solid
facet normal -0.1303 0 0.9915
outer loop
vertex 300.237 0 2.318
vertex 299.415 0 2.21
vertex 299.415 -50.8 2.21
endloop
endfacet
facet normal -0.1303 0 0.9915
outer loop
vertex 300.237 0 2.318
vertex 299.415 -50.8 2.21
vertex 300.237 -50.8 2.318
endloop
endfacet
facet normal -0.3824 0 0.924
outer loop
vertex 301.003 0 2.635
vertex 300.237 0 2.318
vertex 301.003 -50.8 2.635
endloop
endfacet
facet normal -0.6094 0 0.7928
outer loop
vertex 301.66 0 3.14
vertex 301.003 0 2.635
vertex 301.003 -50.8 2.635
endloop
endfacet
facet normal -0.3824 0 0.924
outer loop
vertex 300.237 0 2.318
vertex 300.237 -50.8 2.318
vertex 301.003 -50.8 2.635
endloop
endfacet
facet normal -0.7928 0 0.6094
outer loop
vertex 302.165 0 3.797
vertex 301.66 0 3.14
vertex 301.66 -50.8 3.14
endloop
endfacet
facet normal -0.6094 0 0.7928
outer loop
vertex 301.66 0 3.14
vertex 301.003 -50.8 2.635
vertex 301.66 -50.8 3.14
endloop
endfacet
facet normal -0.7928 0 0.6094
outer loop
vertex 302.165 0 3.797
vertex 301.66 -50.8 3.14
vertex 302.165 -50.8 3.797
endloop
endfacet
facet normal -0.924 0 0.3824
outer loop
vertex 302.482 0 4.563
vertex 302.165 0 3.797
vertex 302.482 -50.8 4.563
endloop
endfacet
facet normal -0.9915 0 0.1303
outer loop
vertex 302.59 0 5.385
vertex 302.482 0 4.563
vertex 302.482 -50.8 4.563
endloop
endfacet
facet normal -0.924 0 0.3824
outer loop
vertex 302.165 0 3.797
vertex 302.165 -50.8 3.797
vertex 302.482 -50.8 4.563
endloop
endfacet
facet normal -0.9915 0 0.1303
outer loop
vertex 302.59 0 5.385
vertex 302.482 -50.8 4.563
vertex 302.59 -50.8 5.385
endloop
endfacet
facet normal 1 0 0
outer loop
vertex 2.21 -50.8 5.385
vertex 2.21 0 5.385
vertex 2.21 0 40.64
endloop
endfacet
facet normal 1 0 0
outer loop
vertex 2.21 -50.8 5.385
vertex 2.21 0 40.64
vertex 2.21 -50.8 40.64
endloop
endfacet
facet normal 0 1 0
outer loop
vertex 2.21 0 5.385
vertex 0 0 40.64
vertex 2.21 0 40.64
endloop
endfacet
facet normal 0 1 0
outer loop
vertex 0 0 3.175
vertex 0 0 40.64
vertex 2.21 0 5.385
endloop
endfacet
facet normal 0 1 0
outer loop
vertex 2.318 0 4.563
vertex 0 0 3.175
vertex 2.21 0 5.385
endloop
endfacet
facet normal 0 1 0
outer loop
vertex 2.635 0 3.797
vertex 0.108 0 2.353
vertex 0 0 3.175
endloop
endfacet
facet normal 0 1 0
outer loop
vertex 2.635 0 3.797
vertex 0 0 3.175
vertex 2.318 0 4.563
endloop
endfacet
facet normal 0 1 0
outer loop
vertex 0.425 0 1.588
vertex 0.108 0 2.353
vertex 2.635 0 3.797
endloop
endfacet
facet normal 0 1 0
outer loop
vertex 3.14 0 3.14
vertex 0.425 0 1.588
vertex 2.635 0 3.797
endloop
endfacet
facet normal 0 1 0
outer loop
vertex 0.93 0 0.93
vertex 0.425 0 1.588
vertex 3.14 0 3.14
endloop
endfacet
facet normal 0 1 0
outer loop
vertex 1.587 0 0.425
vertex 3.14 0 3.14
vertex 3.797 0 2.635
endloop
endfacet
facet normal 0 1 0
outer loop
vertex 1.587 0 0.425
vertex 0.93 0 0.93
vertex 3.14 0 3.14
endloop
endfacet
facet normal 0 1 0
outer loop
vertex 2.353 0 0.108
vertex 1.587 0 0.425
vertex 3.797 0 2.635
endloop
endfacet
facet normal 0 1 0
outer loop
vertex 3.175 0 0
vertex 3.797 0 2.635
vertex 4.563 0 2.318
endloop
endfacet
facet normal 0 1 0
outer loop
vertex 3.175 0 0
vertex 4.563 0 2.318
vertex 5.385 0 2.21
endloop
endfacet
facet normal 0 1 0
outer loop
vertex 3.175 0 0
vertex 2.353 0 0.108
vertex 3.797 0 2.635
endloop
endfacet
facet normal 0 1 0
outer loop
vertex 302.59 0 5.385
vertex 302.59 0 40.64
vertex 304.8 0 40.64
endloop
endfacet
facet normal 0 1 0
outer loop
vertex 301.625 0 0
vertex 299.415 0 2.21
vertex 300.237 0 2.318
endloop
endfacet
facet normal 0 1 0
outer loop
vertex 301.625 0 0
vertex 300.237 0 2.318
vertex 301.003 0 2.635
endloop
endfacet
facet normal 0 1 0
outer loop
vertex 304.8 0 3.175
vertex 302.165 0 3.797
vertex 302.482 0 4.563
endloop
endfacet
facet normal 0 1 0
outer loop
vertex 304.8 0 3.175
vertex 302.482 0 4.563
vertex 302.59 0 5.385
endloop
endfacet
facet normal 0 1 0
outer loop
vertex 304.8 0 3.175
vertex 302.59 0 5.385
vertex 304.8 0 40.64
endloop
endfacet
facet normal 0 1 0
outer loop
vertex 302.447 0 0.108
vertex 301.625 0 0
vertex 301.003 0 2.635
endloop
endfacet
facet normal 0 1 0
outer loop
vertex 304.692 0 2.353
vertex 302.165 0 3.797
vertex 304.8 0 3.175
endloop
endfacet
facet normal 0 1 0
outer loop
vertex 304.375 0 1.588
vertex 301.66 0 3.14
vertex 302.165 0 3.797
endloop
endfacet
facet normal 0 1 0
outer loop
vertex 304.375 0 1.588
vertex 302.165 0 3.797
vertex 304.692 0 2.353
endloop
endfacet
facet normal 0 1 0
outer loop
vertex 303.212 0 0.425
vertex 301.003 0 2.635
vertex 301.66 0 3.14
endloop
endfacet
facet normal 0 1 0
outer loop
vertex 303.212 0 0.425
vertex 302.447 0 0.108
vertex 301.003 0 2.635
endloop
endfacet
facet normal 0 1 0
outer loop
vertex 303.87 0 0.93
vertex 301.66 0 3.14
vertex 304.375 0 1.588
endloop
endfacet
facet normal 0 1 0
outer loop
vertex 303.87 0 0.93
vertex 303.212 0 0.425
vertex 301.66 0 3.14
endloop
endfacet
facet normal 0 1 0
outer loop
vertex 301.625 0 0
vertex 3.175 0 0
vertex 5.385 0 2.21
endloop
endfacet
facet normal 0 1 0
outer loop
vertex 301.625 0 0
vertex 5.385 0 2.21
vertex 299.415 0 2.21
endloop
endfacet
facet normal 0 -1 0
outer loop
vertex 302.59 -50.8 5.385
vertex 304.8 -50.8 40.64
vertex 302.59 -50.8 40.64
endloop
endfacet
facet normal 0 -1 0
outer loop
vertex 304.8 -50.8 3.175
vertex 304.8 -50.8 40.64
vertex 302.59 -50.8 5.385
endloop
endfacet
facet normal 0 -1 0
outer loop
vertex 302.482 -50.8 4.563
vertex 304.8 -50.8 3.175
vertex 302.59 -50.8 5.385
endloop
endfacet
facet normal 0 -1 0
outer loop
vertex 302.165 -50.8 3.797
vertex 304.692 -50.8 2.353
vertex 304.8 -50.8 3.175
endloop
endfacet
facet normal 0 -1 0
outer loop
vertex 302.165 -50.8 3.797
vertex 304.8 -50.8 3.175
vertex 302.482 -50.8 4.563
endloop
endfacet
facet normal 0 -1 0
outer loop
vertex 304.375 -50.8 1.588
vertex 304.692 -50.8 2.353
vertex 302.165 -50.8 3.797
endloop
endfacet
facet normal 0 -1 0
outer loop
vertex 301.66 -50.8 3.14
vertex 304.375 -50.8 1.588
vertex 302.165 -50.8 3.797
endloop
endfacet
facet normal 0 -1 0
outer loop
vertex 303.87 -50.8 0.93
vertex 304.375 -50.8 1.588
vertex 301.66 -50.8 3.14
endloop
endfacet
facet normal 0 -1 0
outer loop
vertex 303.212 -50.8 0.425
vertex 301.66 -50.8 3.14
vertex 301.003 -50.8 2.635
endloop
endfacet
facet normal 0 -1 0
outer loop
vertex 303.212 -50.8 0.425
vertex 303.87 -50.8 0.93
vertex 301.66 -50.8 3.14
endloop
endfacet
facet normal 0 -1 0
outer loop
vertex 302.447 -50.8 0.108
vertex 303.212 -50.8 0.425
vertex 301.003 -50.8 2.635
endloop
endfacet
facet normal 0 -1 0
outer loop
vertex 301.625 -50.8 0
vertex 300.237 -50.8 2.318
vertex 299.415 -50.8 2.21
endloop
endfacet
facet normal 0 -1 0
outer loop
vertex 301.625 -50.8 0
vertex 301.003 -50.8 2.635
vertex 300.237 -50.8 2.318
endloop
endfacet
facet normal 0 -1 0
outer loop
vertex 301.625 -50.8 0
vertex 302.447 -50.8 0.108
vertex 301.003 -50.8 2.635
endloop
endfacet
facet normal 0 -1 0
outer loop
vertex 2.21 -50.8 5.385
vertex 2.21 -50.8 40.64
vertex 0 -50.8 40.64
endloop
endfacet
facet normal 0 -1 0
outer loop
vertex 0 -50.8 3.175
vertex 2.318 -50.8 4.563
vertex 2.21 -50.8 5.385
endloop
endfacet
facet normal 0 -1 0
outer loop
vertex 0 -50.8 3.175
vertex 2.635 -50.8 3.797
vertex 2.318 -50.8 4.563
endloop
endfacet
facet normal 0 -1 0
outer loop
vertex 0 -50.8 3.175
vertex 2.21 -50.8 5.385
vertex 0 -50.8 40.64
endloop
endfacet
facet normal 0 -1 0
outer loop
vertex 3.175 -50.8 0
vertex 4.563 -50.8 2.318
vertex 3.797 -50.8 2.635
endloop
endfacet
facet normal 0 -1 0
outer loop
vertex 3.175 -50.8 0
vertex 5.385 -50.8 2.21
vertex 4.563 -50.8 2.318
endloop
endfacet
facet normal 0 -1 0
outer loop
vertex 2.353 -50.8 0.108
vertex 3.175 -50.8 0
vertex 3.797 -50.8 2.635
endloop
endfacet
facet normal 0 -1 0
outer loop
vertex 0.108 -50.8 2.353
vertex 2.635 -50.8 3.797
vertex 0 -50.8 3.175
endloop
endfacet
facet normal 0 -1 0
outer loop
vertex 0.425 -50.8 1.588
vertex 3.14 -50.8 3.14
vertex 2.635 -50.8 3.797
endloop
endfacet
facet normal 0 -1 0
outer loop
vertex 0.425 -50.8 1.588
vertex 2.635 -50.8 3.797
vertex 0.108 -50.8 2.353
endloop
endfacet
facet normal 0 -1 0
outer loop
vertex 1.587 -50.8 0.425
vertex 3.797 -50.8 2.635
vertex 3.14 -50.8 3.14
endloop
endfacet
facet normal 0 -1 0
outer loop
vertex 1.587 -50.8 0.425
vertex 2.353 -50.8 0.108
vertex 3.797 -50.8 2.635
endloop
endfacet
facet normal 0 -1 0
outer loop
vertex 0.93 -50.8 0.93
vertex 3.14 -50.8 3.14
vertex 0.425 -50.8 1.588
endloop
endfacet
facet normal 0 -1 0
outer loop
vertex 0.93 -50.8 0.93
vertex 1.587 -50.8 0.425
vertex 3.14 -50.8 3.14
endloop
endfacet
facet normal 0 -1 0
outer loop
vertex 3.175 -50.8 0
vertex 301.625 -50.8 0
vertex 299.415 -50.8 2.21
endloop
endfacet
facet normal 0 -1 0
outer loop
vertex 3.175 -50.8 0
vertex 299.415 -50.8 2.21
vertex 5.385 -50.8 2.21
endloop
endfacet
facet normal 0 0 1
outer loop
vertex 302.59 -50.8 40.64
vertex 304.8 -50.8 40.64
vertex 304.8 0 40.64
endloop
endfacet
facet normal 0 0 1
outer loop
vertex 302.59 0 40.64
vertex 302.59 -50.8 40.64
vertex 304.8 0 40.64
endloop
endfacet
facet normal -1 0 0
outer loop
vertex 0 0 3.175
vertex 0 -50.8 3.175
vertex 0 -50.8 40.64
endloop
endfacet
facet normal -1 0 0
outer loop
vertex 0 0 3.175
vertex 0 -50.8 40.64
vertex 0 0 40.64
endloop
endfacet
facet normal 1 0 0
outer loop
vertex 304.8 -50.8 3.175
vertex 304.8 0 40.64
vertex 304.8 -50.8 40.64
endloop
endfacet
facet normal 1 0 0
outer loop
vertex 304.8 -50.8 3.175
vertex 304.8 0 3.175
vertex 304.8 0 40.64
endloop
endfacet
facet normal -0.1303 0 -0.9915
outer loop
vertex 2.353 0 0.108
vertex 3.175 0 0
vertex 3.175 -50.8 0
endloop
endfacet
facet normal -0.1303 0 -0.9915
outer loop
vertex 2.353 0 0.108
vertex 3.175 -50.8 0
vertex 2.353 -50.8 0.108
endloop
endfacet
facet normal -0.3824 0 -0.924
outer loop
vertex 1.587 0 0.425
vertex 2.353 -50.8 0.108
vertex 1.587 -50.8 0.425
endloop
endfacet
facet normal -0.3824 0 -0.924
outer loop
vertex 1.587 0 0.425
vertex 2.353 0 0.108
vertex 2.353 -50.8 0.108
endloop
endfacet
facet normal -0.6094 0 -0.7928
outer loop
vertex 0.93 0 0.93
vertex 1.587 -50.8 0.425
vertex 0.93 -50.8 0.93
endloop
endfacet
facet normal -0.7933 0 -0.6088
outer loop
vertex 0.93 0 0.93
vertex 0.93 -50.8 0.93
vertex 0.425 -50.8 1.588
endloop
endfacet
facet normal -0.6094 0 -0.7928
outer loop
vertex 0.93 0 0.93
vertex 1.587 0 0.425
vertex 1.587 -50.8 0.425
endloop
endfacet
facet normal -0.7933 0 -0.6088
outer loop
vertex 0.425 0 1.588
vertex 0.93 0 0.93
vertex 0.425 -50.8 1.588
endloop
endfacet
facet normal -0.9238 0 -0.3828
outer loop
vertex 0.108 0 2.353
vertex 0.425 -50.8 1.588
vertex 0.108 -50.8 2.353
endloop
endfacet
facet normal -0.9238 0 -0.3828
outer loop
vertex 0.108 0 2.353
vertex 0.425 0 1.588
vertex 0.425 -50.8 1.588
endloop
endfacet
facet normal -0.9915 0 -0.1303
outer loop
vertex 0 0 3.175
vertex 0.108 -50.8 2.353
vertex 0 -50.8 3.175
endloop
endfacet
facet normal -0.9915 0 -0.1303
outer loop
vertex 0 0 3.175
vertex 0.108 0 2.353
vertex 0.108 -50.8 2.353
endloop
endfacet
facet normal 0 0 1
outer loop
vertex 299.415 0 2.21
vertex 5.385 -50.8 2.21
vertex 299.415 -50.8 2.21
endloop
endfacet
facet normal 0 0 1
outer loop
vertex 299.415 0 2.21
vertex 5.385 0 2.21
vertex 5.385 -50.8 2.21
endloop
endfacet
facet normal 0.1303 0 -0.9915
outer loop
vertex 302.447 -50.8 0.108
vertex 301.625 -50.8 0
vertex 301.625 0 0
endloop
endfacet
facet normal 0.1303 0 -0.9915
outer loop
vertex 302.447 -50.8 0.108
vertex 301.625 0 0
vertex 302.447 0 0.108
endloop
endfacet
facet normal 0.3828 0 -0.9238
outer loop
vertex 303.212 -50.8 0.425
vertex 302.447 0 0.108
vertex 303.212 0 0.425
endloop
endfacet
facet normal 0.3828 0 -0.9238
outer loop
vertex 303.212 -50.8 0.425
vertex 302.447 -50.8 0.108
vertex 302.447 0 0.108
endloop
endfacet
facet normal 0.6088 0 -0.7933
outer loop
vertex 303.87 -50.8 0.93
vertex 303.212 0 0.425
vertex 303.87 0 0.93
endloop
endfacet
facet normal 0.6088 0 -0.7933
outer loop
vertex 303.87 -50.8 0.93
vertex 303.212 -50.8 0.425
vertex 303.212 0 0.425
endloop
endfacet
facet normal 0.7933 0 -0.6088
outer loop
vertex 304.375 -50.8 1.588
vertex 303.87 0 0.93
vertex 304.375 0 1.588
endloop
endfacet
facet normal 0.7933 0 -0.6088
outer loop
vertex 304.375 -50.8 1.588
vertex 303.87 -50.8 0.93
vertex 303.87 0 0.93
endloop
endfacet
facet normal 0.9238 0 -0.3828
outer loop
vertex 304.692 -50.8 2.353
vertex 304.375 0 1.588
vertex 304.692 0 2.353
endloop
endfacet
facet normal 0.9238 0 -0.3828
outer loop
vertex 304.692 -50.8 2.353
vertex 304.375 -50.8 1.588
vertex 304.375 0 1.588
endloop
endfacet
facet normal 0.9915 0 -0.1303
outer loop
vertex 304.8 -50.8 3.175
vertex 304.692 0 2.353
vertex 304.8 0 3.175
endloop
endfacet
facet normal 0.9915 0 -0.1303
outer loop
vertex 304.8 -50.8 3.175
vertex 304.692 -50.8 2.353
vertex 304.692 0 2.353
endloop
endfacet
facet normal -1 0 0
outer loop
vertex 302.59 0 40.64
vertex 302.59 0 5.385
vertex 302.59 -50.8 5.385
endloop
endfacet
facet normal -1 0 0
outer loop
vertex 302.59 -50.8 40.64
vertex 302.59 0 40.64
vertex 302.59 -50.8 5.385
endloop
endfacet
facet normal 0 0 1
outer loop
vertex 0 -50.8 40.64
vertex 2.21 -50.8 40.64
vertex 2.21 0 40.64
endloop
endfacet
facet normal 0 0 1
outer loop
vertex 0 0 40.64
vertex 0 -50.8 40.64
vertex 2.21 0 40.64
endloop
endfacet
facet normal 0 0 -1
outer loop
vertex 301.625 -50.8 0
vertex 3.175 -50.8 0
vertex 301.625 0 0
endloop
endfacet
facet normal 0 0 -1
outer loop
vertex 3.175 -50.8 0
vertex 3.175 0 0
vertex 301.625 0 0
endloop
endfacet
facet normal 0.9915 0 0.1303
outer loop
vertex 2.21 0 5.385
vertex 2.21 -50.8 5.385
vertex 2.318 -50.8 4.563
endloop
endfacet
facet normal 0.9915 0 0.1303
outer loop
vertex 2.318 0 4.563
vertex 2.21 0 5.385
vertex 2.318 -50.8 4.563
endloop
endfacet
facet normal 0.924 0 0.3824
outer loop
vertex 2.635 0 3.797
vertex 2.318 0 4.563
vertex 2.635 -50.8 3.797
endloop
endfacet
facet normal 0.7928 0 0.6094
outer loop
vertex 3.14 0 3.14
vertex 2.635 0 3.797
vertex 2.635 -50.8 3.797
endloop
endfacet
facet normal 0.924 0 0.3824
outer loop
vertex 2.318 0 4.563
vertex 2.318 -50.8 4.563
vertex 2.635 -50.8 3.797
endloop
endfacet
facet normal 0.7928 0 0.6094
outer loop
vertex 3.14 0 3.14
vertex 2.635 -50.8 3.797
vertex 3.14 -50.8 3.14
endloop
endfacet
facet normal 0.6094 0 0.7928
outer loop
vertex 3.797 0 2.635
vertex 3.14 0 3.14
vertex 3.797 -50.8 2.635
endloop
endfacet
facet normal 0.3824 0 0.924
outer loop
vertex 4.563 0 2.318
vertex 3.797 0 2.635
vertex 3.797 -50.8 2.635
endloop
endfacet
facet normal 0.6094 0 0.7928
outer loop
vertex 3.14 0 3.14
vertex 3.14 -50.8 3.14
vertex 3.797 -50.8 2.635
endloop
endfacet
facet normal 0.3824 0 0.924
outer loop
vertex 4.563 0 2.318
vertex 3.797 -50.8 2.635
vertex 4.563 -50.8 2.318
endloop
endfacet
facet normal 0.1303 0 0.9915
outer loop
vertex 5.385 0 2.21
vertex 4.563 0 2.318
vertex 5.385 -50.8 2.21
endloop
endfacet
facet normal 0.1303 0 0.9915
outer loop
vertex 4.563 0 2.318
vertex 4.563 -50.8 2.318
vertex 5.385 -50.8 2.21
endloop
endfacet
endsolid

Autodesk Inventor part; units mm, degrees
ref_plane "YZ Plane" through (0, 0, 0) normal (1, 0, 0) x (0, 1, 0)
ref_plane "XZ Plane" through (0, 0, 0) normal (0, 1, 0) x (-1, 0, 0)
ref_plane "XY Plane" through (0, 0, 0) normal (0, 0, 1) x (1, 0, 0)
sketch "Sketch1" plane through (0, 0, 0) normal (0, 0, 1) x (1, 0, 0)
  line L0 (0, 0) -> (304.8, 0)
  line L1 (304.8, 0) -> (304.8, -50.8)
  line L2 (304.8, -50.8) -> (0, -50.8)
  line L3 (0, -50.8) -> (0, 0)
  dimension "d0" = 304.8
  dimension "d1" = 50.8
extrude "Extrusion1" add sketch "Sketch1" along normal blind 2.2098
sketch "Sketch2" plane through (0, 0, 2.2098) normal (0, 0, 1) x (1, 0, 0)
  line L0 (0, -50.8) -> (304.8, -50.8) projected
  line L1 (0, 0) -> (2.2098, 0)
  line L2 (2.2098, 0) -> (2.2098, -50.8)
  line L3 (2.2098, -50.8) -> (0, -50.8)
  line L4 (0, -50.8) -> (0, 0)
  line L5 (304.8, 0) -> (302.5902, 0)
  line L6 (302.5902, 0) -> (302.5902, -50.8)
  line L7 (302.5902, -50.8) -> (304.8, -50.8)
  line L8 (304.8, -50.8) -> (304.8, 0)
  dimension "d4" = 2.2098
  dimension "d5" = 2.2098
extrude "Extrusion2" add sketch "Sketch2" along normal blind 50.8
fillet "Fillet1" radius 3.175 1 edges at (304.8, -25.4, 0)
fillet "Fillet2" radius 3.175 1 edges at (0, -25.4, 0)
fillet "Fillet3" radius 3.175 1 edges at (2.2098, -25.4, 2.2098)
fillet "Fillet4" radius 3.175 1 edges at (302.5902, -25.4, 2.2098)
sketch "Sketch3" plane through (304.8, -50.8, 53.0098) normal (1, 0, 0) x (0, 0, -1)
  line L0 (0, 0) -> (12.3698, 0)
  line L1 (49.8348, 0) -> (0, 0) projected
  line L2 (12.3698, 0) -> (12.3698, 65.8948)
  line L3 (47.625, 50.8) -> (0, 50.8) projected
  line L4 (12.3698, 65.8948) -> (-20.1931, 65.8948)
  line L5 (-20.1931, 65.8948) -> (-20.1931, 0)
  line L6 (-20.1931, 0) -> (12.3698, 0)
  point P0 (53.0098, 50.8)
  dimension "d12" = 12.3698
extrude "Extrusion3" cut sketch "Sketch3" against normal through all
properties part number "Conveyor Brace"
